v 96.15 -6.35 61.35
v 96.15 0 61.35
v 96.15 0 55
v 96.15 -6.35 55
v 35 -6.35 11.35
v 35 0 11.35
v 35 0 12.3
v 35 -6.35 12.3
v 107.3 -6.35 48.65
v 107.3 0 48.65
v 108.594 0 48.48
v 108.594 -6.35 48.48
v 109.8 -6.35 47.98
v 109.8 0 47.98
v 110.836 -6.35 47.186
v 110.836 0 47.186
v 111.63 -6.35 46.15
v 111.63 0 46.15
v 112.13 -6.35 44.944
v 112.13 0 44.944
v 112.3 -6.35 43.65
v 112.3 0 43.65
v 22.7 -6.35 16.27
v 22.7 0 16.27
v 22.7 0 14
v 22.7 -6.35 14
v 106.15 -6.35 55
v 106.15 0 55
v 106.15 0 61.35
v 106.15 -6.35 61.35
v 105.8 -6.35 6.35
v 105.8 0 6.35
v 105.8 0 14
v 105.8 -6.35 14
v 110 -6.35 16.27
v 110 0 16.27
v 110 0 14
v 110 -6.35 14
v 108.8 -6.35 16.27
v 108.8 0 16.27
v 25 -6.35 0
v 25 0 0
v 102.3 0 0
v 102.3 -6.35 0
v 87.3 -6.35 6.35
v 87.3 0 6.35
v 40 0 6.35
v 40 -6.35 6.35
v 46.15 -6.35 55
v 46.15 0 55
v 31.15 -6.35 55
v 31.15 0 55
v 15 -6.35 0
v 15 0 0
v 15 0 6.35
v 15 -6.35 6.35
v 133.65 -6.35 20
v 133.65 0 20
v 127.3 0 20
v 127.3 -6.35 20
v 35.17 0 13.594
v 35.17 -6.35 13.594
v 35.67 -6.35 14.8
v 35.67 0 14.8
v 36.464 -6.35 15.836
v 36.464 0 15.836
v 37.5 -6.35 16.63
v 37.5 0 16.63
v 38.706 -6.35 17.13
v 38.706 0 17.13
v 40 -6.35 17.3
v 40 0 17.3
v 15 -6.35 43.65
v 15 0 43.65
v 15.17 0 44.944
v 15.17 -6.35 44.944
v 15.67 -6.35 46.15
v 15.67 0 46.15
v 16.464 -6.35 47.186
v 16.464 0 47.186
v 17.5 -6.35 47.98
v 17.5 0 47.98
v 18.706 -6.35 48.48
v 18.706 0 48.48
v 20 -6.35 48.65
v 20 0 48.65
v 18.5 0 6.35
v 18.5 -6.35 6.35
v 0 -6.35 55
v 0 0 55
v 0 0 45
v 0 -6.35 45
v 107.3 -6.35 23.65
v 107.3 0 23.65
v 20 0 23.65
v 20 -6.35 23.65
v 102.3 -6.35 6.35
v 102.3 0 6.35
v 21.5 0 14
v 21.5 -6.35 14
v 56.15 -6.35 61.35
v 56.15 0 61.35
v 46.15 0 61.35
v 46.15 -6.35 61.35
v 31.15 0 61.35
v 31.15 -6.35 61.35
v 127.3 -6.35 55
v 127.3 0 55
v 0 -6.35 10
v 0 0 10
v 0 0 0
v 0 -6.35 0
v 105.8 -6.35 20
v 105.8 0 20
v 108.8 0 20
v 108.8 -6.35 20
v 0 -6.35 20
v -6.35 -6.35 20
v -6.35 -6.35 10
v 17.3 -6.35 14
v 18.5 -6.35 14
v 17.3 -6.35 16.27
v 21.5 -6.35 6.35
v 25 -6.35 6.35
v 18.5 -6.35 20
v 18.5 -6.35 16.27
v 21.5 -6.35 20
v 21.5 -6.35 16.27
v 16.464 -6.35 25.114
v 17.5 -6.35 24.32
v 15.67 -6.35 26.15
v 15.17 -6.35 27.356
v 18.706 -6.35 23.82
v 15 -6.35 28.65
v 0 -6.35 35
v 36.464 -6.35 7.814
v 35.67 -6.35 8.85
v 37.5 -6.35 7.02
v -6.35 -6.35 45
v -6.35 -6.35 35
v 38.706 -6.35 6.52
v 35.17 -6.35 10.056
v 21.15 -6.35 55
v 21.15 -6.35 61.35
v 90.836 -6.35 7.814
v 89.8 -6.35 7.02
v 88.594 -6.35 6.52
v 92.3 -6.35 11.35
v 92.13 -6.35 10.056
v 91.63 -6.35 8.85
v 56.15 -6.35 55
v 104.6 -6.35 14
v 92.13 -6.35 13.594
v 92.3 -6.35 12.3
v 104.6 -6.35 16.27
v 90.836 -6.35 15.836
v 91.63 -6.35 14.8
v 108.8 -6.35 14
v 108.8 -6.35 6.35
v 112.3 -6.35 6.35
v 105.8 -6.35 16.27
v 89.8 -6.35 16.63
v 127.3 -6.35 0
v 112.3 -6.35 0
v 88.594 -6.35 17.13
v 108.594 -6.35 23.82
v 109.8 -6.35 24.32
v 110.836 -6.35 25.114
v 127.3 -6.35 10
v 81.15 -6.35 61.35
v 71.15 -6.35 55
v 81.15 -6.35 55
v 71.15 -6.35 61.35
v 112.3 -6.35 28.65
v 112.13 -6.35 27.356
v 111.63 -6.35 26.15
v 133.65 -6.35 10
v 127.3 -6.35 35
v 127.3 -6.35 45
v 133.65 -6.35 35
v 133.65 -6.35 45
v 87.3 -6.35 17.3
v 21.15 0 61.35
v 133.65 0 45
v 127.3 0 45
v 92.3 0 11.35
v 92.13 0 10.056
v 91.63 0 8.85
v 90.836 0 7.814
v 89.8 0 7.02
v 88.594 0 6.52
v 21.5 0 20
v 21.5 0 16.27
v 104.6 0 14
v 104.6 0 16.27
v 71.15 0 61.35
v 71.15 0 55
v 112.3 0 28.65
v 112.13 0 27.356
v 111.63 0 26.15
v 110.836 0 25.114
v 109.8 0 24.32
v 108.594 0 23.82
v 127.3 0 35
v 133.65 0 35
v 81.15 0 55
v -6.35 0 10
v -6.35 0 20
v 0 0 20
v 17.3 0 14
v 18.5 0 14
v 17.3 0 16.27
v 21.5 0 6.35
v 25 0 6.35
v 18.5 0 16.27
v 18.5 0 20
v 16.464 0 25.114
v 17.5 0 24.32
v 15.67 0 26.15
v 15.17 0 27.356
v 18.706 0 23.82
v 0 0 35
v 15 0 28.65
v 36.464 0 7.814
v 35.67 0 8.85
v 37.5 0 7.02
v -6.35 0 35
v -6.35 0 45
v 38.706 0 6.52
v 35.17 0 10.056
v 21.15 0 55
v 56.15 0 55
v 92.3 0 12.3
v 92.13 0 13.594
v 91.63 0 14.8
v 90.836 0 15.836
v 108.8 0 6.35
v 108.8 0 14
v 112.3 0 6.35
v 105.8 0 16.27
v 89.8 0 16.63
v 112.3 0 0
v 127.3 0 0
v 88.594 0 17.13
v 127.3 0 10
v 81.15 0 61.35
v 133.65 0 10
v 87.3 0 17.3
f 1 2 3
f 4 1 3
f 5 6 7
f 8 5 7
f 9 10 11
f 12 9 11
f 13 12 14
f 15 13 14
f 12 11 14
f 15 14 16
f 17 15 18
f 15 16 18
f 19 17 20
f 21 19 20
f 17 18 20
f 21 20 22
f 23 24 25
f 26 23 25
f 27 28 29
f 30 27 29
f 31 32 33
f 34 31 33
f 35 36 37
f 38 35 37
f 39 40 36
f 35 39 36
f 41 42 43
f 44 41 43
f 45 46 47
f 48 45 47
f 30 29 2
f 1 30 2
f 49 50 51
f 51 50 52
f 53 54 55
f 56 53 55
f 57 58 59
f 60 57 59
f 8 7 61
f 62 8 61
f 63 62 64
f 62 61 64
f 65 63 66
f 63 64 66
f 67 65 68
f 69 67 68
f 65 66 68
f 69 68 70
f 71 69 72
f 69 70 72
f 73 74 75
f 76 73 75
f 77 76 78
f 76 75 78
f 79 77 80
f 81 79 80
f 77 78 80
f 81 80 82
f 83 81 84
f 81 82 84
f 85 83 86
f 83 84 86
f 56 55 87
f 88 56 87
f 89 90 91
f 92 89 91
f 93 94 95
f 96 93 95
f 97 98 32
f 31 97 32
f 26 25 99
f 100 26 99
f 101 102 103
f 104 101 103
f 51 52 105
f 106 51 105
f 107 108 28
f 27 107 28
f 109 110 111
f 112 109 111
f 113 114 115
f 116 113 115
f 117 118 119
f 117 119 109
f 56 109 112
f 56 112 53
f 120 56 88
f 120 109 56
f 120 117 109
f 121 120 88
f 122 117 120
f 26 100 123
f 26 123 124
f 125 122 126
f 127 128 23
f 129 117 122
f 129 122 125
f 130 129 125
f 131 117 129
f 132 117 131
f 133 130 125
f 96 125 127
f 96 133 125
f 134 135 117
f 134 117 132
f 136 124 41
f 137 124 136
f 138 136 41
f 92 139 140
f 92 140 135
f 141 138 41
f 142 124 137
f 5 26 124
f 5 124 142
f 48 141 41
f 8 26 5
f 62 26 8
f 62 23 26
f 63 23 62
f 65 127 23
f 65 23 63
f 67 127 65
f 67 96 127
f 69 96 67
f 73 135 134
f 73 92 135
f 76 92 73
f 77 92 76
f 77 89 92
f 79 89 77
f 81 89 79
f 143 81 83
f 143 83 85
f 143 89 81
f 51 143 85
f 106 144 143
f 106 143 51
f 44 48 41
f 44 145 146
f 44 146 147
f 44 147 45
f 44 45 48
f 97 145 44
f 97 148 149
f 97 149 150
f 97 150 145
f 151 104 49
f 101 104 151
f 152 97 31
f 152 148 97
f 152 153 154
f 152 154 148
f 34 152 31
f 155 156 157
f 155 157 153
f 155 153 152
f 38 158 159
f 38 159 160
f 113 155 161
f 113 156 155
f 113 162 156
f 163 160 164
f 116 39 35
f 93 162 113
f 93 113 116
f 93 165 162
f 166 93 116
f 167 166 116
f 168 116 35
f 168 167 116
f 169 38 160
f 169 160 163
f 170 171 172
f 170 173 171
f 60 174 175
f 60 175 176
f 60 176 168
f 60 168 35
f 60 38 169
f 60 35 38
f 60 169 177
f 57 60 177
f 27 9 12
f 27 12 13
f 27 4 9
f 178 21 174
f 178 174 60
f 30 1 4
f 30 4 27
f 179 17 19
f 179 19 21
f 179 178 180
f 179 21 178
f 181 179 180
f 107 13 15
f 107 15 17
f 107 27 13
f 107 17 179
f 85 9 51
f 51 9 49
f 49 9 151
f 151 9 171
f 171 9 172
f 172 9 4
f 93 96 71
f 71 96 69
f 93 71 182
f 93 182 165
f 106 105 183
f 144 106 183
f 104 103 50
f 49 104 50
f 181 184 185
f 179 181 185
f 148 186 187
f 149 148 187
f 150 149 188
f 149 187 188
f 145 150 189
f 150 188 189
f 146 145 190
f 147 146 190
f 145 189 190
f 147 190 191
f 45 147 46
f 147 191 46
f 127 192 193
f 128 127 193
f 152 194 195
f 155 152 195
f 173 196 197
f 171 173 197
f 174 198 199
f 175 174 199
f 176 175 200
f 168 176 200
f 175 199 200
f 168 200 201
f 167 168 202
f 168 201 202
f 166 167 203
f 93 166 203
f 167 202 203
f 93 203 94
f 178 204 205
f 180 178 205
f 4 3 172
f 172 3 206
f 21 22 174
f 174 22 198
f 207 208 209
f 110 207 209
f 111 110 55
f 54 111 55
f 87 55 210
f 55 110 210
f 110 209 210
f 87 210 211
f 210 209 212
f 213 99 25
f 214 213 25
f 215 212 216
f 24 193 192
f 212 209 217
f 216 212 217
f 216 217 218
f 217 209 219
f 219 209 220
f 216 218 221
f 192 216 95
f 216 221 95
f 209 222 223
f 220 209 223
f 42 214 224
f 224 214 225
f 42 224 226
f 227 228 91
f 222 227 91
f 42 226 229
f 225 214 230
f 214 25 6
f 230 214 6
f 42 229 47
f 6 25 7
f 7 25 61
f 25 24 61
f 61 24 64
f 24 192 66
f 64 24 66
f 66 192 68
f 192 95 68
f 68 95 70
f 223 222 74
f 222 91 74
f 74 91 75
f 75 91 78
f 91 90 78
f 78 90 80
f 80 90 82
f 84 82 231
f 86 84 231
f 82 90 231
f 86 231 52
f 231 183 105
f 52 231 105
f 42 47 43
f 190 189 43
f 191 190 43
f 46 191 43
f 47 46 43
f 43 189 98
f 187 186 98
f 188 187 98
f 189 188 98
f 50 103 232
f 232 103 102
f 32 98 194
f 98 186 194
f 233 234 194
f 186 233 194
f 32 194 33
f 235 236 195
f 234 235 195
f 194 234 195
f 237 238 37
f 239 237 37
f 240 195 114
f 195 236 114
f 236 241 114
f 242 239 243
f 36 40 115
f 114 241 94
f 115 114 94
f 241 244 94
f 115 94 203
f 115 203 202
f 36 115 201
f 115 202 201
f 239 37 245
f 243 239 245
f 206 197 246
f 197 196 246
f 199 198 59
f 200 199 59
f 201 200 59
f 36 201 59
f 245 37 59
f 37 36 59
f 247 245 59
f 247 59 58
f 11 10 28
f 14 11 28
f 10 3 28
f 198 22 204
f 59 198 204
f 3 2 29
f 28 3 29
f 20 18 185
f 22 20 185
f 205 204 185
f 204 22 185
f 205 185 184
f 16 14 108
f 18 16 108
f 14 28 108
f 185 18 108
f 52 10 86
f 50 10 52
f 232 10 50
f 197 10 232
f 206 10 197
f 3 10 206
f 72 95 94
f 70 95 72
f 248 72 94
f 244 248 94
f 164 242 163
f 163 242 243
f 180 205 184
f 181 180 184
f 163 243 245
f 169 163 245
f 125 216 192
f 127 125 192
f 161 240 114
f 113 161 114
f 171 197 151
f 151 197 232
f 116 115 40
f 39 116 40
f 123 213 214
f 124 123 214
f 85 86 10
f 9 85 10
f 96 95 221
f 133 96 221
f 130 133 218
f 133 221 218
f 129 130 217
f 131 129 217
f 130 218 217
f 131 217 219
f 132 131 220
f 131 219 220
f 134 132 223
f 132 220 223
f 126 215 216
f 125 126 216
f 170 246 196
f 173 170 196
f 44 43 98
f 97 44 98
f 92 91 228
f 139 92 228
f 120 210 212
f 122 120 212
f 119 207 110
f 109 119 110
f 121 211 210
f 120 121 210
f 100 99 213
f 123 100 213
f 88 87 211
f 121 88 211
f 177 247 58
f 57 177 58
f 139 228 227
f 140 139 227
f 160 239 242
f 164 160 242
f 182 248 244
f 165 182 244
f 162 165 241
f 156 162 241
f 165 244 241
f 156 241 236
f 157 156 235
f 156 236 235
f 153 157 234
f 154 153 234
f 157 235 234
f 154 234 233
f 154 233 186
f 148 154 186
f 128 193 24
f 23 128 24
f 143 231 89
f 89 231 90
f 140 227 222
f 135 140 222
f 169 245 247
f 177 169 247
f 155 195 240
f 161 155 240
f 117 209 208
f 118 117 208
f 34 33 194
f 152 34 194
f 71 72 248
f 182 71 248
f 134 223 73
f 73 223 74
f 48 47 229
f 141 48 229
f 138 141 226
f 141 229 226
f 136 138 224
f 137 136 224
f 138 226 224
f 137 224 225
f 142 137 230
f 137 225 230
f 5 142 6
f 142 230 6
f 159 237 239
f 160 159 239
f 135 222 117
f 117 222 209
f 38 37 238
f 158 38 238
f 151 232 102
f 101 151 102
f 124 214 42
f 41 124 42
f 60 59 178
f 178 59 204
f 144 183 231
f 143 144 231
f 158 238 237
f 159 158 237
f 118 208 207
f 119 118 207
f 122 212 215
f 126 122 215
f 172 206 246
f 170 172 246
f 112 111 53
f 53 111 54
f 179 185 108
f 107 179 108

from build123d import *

# Parameters (mm, degrees)
F1_DEPTH = 6.35


with BuildPart() as f1:
    # F0 (on Front) → F1 (new body)
    with BuildSketch(Plane.XZ):
        Polygon((0, 10), (0, 0), (15, 0), (15, 6.35), (18.5, 6.35), (18.5, 14), (17.3, 14), (17.3, 16.27), (18.5, 16.27), (18.5, 20), (21.5, 20), (21.5, 16.27), (22.7, 16.27), (22.7, 14), (21.5, 14), (21.5, 6.35), (25, 6.35), (25, 0), (102.3, 0), (102.3, 6.35), (105.8, 6.35), (105.8, 14), (104.6, 14), (104.6, 16.27), (105.8, 16.27), (105.8, 20), (108.8, 20), (108.8, 16.27), (110, 16.27), (110, 14), (108.8, 14), (108.8, 6.35), (112.3, 6.35), (112.3, 0), (127.3, 0), (127.3, 10), (133.65, 10), (133.65, 20), (127.3, 20), (127.3, 35), (133.65, 35), (133.65, 45), (127.3, 45), (127.3, 55), (106.15, 55), (106.15, 61.35), (96.15, 61.35), (96.15, 55), (81.15, 55), (81.15, 61.35), (71.15, 61.35), (71.15, 55), (56.15, 55), (56.15, 61.35), (46.15, 61.35), (46.15, 55), (31.15, 55), (31.15, 61.35), (21.15, 61.35), (21.15, 55), (0, 55), (0, 45), (-6.35, 45), (-6.35, 35), (0, 35), (0, 20), (-6.35, 20), (-6.35, 10), align=None)
        with BuildLine():
            ThreePointArc((35, 12.3), (36.464466, 15.835534), (40, 17.3))
            Line((40, 17.3), (87.3, 17.3))
            ThreePointArc((87.3, 17.3), (90.835534, 15.835534), (92.3, 12.3))
            Line((92.3, 12.3), (92.3, 11.35))
            ThreePointArc((92.3, 11.35), (90.835534, 7.814466), (87.3, 6.35))
            Line((87.3, 6.35), (40, 6.35))
            ThreePointArc((40, 6.35), (36.464466, 7.814466), (35, 11.35))
            Line((35, 11.35), (35, 12.3))
        make_face(mode=Mode.SUBTRACT)
        with BuildLine():
            ThreePointArc((15, 43.65), (16.464466, 47.185534), (20, 48.65))
            Line((20, 48.65), (107.3, 48.65))
            ThreePointArc((107.3, 48.65), (110.835534, 47.185534), (112.3, 43.65))
            Line((112.3, 43.65), (112.3, 28.65))
            ThreePointArc((112.3, 28.65), (110.835534, 25.114466), (107.3, 23.65))
            Line((107.3, 23.65), (20, 23.65))
            ThreePointArc((20, 23.65), (16.464466, 25.114466), (15, 28.65))
            Line((15, 28.65), (15, 43.65))
        make_face(mode=Mode.SUBTRACT)
    extrude(amount=F1_DEPTH)


solid = f1.part
